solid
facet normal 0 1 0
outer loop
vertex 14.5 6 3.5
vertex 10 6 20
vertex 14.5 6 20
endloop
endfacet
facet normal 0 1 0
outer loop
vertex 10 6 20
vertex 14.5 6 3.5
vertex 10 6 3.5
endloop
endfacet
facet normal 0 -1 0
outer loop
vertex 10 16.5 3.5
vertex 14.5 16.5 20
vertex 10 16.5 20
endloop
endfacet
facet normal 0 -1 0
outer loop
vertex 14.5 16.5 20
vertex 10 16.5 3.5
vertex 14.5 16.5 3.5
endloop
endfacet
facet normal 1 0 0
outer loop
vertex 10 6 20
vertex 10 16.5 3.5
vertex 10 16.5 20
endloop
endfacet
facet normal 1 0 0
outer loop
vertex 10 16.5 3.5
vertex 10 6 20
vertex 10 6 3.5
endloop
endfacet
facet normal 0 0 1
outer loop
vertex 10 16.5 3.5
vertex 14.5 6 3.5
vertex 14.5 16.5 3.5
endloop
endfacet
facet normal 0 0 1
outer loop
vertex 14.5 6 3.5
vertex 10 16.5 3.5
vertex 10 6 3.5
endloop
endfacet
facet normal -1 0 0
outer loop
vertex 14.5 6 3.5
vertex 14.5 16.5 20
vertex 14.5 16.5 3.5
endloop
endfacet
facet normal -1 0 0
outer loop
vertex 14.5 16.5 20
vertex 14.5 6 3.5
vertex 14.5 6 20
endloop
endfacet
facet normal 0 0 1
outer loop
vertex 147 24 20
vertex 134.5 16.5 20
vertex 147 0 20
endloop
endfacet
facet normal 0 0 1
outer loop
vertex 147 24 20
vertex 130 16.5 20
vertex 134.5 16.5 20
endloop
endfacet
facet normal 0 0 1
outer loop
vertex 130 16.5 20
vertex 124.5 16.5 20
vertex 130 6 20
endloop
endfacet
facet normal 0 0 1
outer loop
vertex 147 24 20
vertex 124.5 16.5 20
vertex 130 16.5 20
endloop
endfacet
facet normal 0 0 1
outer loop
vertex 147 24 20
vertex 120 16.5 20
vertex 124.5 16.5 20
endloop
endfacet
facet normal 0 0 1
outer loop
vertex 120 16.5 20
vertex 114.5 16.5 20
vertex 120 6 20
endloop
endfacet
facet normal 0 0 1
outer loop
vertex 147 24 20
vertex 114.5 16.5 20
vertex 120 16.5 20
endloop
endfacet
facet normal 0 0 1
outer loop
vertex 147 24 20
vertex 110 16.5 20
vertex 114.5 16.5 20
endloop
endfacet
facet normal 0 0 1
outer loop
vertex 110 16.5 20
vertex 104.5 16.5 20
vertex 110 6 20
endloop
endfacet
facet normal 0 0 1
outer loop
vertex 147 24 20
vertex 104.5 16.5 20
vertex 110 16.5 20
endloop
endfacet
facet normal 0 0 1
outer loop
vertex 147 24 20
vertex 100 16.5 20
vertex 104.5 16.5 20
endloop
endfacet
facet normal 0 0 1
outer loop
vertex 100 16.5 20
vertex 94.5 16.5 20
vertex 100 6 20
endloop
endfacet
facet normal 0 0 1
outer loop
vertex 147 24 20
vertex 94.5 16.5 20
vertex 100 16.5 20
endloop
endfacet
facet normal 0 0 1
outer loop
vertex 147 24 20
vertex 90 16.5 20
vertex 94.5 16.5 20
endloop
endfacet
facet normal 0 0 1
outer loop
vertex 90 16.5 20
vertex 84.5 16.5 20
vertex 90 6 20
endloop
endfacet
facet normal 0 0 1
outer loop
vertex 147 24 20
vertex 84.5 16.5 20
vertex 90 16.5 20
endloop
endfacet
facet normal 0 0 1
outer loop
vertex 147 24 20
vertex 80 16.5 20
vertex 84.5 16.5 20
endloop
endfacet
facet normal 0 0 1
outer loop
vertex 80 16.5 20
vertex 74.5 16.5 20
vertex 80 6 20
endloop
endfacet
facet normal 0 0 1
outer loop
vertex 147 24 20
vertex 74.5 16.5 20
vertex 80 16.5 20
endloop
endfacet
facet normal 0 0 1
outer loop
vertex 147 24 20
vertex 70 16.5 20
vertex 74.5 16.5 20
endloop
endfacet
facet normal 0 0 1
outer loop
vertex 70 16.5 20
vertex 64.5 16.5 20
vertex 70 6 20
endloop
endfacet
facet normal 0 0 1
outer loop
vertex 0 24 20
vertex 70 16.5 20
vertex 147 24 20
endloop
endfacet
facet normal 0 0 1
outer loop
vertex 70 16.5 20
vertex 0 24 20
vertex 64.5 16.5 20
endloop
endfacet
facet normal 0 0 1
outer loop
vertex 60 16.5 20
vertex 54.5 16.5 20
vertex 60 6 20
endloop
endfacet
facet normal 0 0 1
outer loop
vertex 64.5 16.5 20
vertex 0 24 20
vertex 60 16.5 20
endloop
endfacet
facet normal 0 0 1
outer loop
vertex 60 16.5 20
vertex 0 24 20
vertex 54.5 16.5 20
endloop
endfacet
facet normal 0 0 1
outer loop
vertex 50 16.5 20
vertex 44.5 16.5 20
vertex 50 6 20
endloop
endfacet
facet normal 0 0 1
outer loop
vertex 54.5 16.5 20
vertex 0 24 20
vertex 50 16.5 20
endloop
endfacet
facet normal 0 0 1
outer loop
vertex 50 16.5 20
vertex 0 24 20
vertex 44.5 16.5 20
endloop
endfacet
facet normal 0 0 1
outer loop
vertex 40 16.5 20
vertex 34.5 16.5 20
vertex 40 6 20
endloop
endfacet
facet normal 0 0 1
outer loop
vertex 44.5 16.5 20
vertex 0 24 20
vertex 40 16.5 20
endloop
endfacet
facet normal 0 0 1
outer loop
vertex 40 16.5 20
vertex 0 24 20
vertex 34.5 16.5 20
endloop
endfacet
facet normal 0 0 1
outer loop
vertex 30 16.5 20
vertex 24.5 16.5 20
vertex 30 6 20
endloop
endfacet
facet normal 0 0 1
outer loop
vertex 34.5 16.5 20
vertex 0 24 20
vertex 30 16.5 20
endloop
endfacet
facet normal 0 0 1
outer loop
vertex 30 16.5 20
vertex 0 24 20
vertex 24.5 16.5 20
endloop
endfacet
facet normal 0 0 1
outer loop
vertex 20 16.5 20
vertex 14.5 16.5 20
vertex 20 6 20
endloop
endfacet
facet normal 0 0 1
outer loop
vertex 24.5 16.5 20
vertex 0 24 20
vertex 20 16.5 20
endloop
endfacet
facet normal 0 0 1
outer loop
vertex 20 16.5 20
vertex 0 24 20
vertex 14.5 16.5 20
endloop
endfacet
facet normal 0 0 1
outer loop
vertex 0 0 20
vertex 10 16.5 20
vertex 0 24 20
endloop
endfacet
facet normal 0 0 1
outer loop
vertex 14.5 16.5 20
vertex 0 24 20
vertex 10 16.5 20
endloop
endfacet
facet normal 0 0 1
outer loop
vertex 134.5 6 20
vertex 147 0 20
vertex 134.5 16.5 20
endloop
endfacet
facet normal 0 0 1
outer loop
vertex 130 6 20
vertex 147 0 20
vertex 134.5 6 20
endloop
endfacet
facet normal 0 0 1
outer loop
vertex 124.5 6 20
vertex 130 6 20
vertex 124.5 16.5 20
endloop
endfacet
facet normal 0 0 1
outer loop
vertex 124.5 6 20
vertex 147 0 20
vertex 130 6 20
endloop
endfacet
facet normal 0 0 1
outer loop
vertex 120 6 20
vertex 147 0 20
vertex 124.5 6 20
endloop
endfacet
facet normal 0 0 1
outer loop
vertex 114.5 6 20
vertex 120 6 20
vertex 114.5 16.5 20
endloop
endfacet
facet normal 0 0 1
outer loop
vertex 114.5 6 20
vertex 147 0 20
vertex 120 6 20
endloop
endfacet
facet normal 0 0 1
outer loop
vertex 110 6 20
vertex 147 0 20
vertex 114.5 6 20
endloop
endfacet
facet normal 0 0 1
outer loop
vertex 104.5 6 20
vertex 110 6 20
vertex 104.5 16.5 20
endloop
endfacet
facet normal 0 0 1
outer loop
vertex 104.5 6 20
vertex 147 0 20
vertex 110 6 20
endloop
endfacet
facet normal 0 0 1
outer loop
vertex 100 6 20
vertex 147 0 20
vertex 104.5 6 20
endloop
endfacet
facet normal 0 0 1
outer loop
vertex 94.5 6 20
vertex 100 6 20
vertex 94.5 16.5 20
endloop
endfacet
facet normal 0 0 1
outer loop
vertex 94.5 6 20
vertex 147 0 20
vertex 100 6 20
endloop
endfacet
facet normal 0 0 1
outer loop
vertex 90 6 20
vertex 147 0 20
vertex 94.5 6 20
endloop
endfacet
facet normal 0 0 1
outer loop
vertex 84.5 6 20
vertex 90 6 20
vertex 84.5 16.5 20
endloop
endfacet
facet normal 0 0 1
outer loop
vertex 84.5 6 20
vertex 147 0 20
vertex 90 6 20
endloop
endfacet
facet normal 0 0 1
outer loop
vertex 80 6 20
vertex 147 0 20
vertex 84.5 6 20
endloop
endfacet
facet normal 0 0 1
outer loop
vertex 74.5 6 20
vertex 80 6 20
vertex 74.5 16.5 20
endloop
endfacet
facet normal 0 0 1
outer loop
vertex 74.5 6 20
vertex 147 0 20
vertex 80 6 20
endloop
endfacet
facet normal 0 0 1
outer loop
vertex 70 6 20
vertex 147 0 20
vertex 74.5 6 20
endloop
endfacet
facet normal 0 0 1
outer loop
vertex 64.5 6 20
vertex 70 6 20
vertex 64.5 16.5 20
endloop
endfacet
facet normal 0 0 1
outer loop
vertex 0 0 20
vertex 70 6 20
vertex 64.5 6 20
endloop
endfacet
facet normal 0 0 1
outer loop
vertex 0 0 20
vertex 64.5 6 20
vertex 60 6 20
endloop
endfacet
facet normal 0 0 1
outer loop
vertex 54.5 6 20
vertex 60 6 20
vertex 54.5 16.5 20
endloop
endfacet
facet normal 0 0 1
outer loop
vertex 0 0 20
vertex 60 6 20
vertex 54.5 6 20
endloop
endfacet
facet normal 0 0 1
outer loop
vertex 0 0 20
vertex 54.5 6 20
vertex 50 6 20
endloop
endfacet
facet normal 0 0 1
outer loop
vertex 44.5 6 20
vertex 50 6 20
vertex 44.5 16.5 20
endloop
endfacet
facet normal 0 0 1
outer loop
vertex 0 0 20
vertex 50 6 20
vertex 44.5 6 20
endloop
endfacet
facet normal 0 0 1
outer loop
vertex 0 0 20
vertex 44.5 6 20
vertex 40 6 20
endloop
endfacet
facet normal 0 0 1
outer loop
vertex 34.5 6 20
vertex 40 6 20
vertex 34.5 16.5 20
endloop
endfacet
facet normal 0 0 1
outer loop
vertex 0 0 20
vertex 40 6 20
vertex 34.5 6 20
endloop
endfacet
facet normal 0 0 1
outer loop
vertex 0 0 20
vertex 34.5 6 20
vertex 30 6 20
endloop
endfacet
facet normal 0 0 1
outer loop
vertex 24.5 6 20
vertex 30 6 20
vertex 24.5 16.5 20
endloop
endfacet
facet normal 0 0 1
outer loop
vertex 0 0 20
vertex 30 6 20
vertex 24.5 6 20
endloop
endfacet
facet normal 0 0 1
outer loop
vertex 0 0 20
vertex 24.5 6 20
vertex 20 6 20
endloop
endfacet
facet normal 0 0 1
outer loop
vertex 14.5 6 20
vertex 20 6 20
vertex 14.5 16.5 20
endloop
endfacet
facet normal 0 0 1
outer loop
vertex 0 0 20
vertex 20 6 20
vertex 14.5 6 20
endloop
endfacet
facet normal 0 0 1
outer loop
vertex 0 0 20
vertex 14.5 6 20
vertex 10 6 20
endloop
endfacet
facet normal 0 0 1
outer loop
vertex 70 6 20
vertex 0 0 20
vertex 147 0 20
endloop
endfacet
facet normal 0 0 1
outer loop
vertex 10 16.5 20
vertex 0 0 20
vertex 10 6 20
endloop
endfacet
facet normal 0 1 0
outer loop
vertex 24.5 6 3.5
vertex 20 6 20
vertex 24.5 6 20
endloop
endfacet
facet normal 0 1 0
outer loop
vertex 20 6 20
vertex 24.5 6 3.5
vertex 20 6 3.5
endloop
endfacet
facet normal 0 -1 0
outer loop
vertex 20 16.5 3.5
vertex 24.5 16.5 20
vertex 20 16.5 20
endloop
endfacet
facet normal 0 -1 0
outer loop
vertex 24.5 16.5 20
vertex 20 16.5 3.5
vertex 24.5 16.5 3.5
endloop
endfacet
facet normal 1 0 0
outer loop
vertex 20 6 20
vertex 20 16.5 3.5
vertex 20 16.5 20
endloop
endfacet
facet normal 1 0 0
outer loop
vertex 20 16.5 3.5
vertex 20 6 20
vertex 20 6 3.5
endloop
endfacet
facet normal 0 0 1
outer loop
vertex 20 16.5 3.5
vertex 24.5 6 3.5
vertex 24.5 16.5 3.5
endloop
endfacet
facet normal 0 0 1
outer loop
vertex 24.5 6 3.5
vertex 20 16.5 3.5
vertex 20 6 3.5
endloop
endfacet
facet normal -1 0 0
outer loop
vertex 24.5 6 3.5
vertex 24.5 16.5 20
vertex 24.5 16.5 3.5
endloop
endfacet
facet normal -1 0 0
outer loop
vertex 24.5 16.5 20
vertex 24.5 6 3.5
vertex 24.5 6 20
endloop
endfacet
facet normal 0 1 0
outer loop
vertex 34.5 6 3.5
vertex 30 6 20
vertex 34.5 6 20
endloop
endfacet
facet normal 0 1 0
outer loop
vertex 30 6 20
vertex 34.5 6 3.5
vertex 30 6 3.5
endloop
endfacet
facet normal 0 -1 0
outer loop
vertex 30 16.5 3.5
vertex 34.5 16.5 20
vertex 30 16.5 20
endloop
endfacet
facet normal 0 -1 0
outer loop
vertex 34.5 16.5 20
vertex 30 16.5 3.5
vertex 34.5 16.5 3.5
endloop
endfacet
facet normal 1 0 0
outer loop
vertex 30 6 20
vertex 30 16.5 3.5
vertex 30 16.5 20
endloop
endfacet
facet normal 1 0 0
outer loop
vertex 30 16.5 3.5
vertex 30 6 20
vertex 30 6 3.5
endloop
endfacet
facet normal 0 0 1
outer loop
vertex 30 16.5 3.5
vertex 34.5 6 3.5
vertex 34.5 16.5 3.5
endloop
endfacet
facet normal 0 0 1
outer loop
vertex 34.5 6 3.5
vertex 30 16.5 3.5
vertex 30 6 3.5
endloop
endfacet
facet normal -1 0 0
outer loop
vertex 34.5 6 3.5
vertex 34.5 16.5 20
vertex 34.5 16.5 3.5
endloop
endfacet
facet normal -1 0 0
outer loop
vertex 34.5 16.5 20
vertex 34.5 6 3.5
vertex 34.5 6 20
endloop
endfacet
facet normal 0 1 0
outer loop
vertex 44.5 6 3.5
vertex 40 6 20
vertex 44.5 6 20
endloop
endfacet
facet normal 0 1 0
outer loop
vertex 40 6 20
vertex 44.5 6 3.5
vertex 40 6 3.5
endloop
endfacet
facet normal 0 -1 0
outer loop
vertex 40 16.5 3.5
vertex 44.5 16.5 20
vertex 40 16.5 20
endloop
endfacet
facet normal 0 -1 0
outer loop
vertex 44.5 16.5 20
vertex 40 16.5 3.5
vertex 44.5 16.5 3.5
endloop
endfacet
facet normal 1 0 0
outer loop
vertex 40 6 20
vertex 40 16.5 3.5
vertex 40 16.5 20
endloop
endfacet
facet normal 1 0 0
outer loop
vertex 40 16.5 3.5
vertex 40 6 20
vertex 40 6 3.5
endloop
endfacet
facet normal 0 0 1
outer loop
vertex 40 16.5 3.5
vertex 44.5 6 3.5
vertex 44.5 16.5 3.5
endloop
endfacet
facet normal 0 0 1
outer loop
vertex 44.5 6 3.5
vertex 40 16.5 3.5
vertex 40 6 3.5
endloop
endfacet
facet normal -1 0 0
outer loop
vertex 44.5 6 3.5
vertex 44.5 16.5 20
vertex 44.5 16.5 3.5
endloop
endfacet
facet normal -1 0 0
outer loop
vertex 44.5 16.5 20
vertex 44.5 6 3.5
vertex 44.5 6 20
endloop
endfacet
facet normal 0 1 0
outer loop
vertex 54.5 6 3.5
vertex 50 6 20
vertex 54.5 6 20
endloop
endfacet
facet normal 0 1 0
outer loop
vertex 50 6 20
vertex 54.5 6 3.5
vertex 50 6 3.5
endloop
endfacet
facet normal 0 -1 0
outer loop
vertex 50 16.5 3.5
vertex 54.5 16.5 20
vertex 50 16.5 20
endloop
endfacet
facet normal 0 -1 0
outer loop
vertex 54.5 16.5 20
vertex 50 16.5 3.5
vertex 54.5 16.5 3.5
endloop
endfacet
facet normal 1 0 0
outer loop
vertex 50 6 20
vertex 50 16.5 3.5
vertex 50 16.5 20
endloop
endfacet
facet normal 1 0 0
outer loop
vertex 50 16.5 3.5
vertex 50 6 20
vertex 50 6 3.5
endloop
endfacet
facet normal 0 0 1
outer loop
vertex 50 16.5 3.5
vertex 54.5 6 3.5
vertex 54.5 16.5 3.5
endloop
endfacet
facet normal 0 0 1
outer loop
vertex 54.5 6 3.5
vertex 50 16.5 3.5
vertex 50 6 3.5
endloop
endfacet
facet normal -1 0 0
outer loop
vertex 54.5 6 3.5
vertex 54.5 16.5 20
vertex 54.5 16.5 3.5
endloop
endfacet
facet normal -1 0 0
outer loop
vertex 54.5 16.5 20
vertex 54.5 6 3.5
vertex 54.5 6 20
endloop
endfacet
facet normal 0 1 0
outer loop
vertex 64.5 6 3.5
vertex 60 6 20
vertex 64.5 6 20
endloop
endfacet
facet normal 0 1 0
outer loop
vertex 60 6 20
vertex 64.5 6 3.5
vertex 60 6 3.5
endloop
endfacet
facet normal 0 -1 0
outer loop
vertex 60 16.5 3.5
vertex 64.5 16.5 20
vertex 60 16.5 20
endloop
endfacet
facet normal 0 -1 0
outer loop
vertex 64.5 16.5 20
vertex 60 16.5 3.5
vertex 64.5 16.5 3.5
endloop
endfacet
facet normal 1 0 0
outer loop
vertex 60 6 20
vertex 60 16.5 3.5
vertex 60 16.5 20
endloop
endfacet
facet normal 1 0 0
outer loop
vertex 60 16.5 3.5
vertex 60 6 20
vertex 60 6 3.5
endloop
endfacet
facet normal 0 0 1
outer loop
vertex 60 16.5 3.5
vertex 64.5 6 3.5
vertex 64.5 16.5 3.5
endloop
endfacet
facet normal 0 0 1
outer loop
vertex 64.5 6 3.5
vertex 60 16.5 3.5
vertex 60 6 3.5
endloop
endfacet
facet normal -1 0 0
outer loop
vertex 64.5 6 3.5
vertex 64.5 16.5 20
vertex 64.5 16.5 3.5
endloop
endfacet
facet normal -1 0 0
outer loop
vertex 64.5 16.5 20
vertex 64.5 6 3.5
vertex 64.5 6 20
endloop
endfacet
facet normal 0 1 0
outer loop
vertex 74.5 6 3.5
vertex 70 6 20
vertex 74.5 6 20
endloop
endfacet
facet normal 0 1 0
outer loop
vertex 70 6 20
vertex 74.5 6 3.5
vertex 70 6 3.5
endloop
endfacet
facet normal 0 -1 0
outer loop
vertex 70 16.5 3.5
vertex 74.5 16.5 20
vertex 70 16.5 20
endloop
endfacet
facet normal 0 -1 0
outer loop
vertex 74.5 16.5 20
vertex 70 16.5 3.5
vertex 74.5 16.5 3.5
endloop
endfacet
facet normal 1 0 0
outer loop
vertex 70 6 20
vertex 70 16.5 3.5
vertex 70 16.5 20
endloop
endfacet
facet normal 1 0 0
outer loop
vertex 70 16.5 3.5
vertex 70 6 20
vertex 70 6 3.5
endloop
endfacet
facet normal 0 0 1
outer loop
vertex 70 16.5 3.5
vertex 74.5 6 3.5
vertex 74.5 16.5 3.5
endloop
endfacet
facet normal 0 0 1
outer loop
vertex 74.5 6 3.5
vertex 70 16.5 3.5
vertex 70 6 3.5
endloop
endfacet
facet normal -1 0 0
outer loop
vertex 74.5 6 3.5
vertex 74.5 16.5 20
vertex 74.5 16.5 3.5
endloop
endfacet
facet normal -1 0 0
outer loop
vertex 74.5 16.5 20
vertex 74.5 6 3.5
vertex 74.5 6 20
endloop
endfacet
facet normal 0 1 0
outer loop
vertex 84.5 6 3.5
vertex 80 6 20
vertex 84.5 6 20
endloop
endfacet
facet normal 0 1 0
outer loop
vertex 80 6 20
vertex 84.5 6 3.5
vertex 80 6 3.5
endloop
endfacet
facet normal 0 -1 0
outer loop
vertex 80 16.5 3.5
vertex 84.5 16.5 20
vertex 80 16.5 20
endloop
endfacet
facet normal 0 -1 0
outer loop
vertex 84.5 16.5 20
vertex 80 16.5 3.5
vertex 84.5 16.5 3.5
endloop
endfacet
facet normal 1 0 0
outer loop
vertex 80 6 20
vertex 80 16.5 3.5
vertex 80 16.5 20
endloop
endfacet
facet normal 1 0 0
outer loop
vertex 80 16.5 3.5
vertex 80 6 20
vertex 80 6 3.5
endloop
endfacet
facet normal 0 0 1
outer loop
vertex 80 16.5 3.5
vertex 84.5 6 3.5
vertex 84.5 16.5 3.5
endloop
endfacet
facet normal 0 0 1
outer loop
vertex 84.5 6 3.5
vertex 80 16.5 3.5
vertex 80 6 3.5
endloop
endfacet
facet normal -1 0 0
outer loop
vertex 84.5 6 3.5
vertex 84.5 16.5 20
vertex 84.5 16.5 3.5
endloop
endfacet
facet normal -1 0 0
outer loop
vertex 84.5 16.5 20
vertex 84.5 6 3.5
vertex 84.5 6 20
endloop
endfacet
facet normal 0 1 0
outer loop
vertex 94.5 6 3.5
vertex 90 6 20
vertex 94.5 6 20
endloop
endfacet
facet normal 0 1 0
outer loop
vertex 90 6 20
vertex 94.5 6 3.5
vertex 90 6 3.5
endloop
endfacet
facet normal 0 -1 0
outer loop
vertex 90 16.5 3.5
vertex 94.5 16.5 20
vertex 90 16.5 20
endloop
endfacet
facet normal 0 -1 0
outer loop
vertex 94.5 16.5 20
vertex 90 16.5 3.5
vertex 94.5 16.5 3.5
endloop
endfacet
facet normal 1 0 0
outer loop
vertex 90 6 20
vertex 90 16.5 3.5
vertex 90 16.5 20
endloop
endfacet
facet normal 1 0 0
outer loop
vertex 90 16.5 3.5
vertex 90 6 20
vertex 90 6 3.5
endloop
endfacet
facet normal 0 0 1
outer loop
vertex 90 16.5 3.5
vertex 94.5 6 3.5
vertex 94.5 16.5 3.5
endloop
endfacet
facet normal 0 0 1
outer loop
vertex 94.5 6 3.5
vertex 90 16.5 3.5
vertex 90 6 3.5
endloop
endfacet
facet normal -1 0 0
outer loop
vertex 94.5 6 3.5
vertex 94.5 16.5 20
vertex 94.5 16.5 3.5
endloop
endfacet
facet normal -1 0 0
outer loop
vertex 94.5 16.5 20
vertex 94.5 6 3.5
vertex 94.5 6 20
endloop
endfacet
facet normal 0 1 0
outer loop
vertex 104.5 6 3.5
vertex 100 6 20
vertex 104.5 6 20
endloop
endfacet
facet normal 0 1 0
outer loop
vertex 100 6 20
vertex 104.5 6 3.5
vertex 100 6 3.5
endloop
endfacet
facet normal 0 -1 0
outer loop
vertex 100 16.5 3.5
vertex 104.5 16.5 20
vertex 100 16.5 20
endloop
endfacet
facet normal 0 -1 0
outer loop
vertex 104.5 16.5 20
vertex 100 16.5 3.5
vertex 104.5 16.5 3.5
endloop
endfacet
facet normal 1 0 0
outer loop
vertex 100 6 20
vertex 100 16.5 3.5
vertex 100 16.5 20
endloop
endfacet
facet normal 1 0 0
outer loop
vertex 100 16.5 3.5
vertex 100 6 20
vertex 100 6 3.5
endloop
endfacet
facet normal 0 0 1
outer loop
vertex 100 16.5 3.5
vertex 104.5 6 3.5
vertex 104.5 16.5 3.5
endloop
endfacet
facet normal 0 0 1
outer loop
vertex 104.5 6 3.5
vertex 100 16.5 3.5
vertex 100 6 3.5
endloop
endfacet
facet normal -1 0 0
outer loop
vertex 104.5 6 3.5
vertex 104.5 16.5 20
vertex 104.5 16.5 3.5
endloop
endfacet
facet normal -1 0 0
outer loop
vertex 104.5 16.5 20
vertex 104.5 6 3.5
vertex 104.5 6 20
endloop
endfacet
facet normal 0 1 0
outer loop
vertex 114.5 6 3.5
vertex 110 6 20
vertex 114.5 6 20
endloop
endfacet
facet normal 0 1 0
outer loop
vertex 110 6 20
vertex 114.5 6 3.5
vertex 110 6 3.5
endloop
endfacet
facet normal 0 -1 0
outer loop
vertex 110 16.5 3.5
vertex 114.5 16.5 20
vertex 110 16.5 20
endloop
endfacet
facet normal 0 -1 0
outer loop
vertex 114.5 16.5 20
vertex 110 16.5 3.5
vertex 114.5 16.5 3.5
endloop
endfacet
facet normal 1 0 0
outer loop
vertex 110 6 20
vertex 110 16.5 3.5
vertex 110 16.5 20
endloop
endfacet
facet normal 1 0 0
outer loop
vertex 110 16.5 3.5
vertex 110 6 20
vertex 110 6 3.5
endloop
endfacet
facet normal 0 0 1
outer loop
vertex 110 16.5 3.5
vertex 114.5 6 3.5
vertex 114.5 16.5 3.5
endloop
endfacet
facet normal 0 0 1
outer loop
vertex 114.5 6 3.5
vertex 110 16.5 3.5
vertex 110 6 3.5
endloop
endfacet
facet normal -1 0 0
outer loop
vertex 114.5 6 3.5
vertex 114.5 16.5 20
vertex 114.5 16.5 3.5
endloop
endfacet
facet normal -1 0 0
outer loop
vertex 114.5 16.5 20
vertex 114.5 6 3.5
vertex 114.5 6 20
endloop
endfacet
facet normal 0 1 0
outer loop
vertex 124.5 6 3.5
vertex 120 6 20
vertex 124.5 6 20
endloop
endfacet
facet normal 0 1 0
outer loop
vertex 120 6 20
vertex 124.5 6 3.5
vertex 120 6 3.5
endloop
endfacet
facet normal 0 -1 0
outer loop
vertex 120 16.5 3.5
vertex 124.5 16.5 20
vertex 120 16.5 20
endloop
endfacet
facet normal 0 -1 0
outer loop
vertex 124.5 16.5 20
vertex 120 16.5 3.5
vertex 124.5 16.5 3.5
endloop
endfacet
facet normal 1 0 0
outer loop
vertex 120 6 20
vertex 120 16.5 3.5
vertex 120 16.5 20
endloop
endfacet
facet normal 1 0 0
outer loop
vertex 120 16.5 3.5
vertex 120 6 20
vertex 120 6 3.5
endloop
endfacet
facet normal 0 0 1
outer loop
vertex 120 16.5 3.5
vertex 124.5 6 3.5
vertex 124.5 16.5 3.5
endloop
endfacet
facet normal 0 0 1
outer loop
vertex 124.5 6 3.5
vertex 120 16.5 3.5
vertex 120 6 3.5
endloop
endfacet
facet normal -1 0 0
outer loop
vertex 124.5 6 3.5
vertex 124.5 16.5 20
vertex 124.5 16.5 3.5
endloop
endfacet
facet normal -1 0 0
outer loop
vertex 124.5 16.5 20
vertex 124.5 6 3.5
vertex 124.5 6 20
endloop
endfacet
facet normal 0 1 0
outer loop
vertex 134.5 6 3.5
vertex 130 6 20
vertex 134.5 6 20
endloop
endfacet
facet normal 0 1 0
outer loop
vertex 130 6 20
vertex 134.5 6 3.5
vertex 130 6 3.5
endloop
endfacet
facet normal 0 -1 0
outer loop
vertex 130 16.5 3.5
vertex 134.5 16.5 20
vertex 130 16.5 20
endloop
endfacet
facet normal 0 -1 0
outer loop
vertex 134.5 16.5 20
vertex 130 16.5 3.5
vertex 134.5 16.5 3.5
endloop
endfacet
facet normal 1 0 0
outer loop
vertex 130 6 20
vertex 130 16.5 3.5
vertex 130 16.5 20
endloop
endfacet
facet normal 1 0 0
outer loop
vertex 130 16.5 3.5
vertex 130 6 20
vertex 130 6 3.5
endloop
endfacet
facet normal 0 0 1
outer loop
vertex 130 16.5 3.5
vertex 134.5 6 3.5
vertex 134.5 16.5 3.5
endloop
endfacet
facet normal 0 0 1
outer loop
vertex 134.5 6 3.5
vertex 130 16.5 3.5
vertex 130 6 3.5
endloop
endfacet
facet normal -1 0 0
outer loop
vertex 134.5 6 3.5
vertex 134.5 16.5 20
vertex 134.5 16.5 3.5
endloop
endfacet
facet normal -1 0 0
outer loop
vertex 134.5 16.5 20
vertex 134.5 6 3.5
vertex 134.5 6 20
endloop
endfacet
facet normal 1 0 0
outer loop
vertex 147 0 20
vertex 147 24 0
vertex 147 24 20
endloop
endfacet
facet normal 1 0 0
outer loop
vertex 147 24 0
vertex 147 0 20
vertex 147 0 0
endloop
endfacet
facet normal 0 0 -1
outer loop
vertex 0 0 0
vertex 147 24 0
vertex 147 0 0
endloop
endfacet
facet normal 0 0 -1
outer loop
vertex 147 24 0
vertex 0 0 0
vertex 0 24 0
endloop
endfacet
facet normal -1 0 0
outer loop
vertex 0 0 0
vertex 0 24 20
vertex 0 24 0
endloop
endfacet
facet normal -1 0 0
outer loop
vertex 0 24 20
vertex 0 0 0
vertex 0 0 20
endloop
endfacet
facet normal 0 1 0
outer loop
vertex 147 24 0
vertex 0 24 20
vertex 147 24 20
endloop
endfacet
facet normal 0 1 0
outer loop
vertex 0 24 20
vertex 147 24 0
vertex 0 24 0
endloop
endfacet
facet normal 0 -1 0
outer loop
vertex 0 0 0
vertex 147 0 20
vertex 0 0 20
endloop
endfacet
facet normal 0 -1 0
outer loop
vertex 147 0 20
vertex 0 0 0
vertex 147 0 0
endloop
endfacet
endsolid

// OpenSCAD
$fn = 300;
height = 20;
length = 147;
spacing = 7;

difference(){
    cube([length, 24, height]);
    if(height - 12 > 5 && spacing >= 7 && spacing <= 20){
        for(x = [10 : 10 : length-10]){
        hull(){
            translate([x, 6, height-4.5]) cube(4.5);
            translate([x, 12, height-4.5]) cube(4.5);
            translate([x, 12, height-12-4.5]) cube(4.5);
            translate([x, 6, height-12-4.5]) cube(4.5);
        }
        }

    }
}
